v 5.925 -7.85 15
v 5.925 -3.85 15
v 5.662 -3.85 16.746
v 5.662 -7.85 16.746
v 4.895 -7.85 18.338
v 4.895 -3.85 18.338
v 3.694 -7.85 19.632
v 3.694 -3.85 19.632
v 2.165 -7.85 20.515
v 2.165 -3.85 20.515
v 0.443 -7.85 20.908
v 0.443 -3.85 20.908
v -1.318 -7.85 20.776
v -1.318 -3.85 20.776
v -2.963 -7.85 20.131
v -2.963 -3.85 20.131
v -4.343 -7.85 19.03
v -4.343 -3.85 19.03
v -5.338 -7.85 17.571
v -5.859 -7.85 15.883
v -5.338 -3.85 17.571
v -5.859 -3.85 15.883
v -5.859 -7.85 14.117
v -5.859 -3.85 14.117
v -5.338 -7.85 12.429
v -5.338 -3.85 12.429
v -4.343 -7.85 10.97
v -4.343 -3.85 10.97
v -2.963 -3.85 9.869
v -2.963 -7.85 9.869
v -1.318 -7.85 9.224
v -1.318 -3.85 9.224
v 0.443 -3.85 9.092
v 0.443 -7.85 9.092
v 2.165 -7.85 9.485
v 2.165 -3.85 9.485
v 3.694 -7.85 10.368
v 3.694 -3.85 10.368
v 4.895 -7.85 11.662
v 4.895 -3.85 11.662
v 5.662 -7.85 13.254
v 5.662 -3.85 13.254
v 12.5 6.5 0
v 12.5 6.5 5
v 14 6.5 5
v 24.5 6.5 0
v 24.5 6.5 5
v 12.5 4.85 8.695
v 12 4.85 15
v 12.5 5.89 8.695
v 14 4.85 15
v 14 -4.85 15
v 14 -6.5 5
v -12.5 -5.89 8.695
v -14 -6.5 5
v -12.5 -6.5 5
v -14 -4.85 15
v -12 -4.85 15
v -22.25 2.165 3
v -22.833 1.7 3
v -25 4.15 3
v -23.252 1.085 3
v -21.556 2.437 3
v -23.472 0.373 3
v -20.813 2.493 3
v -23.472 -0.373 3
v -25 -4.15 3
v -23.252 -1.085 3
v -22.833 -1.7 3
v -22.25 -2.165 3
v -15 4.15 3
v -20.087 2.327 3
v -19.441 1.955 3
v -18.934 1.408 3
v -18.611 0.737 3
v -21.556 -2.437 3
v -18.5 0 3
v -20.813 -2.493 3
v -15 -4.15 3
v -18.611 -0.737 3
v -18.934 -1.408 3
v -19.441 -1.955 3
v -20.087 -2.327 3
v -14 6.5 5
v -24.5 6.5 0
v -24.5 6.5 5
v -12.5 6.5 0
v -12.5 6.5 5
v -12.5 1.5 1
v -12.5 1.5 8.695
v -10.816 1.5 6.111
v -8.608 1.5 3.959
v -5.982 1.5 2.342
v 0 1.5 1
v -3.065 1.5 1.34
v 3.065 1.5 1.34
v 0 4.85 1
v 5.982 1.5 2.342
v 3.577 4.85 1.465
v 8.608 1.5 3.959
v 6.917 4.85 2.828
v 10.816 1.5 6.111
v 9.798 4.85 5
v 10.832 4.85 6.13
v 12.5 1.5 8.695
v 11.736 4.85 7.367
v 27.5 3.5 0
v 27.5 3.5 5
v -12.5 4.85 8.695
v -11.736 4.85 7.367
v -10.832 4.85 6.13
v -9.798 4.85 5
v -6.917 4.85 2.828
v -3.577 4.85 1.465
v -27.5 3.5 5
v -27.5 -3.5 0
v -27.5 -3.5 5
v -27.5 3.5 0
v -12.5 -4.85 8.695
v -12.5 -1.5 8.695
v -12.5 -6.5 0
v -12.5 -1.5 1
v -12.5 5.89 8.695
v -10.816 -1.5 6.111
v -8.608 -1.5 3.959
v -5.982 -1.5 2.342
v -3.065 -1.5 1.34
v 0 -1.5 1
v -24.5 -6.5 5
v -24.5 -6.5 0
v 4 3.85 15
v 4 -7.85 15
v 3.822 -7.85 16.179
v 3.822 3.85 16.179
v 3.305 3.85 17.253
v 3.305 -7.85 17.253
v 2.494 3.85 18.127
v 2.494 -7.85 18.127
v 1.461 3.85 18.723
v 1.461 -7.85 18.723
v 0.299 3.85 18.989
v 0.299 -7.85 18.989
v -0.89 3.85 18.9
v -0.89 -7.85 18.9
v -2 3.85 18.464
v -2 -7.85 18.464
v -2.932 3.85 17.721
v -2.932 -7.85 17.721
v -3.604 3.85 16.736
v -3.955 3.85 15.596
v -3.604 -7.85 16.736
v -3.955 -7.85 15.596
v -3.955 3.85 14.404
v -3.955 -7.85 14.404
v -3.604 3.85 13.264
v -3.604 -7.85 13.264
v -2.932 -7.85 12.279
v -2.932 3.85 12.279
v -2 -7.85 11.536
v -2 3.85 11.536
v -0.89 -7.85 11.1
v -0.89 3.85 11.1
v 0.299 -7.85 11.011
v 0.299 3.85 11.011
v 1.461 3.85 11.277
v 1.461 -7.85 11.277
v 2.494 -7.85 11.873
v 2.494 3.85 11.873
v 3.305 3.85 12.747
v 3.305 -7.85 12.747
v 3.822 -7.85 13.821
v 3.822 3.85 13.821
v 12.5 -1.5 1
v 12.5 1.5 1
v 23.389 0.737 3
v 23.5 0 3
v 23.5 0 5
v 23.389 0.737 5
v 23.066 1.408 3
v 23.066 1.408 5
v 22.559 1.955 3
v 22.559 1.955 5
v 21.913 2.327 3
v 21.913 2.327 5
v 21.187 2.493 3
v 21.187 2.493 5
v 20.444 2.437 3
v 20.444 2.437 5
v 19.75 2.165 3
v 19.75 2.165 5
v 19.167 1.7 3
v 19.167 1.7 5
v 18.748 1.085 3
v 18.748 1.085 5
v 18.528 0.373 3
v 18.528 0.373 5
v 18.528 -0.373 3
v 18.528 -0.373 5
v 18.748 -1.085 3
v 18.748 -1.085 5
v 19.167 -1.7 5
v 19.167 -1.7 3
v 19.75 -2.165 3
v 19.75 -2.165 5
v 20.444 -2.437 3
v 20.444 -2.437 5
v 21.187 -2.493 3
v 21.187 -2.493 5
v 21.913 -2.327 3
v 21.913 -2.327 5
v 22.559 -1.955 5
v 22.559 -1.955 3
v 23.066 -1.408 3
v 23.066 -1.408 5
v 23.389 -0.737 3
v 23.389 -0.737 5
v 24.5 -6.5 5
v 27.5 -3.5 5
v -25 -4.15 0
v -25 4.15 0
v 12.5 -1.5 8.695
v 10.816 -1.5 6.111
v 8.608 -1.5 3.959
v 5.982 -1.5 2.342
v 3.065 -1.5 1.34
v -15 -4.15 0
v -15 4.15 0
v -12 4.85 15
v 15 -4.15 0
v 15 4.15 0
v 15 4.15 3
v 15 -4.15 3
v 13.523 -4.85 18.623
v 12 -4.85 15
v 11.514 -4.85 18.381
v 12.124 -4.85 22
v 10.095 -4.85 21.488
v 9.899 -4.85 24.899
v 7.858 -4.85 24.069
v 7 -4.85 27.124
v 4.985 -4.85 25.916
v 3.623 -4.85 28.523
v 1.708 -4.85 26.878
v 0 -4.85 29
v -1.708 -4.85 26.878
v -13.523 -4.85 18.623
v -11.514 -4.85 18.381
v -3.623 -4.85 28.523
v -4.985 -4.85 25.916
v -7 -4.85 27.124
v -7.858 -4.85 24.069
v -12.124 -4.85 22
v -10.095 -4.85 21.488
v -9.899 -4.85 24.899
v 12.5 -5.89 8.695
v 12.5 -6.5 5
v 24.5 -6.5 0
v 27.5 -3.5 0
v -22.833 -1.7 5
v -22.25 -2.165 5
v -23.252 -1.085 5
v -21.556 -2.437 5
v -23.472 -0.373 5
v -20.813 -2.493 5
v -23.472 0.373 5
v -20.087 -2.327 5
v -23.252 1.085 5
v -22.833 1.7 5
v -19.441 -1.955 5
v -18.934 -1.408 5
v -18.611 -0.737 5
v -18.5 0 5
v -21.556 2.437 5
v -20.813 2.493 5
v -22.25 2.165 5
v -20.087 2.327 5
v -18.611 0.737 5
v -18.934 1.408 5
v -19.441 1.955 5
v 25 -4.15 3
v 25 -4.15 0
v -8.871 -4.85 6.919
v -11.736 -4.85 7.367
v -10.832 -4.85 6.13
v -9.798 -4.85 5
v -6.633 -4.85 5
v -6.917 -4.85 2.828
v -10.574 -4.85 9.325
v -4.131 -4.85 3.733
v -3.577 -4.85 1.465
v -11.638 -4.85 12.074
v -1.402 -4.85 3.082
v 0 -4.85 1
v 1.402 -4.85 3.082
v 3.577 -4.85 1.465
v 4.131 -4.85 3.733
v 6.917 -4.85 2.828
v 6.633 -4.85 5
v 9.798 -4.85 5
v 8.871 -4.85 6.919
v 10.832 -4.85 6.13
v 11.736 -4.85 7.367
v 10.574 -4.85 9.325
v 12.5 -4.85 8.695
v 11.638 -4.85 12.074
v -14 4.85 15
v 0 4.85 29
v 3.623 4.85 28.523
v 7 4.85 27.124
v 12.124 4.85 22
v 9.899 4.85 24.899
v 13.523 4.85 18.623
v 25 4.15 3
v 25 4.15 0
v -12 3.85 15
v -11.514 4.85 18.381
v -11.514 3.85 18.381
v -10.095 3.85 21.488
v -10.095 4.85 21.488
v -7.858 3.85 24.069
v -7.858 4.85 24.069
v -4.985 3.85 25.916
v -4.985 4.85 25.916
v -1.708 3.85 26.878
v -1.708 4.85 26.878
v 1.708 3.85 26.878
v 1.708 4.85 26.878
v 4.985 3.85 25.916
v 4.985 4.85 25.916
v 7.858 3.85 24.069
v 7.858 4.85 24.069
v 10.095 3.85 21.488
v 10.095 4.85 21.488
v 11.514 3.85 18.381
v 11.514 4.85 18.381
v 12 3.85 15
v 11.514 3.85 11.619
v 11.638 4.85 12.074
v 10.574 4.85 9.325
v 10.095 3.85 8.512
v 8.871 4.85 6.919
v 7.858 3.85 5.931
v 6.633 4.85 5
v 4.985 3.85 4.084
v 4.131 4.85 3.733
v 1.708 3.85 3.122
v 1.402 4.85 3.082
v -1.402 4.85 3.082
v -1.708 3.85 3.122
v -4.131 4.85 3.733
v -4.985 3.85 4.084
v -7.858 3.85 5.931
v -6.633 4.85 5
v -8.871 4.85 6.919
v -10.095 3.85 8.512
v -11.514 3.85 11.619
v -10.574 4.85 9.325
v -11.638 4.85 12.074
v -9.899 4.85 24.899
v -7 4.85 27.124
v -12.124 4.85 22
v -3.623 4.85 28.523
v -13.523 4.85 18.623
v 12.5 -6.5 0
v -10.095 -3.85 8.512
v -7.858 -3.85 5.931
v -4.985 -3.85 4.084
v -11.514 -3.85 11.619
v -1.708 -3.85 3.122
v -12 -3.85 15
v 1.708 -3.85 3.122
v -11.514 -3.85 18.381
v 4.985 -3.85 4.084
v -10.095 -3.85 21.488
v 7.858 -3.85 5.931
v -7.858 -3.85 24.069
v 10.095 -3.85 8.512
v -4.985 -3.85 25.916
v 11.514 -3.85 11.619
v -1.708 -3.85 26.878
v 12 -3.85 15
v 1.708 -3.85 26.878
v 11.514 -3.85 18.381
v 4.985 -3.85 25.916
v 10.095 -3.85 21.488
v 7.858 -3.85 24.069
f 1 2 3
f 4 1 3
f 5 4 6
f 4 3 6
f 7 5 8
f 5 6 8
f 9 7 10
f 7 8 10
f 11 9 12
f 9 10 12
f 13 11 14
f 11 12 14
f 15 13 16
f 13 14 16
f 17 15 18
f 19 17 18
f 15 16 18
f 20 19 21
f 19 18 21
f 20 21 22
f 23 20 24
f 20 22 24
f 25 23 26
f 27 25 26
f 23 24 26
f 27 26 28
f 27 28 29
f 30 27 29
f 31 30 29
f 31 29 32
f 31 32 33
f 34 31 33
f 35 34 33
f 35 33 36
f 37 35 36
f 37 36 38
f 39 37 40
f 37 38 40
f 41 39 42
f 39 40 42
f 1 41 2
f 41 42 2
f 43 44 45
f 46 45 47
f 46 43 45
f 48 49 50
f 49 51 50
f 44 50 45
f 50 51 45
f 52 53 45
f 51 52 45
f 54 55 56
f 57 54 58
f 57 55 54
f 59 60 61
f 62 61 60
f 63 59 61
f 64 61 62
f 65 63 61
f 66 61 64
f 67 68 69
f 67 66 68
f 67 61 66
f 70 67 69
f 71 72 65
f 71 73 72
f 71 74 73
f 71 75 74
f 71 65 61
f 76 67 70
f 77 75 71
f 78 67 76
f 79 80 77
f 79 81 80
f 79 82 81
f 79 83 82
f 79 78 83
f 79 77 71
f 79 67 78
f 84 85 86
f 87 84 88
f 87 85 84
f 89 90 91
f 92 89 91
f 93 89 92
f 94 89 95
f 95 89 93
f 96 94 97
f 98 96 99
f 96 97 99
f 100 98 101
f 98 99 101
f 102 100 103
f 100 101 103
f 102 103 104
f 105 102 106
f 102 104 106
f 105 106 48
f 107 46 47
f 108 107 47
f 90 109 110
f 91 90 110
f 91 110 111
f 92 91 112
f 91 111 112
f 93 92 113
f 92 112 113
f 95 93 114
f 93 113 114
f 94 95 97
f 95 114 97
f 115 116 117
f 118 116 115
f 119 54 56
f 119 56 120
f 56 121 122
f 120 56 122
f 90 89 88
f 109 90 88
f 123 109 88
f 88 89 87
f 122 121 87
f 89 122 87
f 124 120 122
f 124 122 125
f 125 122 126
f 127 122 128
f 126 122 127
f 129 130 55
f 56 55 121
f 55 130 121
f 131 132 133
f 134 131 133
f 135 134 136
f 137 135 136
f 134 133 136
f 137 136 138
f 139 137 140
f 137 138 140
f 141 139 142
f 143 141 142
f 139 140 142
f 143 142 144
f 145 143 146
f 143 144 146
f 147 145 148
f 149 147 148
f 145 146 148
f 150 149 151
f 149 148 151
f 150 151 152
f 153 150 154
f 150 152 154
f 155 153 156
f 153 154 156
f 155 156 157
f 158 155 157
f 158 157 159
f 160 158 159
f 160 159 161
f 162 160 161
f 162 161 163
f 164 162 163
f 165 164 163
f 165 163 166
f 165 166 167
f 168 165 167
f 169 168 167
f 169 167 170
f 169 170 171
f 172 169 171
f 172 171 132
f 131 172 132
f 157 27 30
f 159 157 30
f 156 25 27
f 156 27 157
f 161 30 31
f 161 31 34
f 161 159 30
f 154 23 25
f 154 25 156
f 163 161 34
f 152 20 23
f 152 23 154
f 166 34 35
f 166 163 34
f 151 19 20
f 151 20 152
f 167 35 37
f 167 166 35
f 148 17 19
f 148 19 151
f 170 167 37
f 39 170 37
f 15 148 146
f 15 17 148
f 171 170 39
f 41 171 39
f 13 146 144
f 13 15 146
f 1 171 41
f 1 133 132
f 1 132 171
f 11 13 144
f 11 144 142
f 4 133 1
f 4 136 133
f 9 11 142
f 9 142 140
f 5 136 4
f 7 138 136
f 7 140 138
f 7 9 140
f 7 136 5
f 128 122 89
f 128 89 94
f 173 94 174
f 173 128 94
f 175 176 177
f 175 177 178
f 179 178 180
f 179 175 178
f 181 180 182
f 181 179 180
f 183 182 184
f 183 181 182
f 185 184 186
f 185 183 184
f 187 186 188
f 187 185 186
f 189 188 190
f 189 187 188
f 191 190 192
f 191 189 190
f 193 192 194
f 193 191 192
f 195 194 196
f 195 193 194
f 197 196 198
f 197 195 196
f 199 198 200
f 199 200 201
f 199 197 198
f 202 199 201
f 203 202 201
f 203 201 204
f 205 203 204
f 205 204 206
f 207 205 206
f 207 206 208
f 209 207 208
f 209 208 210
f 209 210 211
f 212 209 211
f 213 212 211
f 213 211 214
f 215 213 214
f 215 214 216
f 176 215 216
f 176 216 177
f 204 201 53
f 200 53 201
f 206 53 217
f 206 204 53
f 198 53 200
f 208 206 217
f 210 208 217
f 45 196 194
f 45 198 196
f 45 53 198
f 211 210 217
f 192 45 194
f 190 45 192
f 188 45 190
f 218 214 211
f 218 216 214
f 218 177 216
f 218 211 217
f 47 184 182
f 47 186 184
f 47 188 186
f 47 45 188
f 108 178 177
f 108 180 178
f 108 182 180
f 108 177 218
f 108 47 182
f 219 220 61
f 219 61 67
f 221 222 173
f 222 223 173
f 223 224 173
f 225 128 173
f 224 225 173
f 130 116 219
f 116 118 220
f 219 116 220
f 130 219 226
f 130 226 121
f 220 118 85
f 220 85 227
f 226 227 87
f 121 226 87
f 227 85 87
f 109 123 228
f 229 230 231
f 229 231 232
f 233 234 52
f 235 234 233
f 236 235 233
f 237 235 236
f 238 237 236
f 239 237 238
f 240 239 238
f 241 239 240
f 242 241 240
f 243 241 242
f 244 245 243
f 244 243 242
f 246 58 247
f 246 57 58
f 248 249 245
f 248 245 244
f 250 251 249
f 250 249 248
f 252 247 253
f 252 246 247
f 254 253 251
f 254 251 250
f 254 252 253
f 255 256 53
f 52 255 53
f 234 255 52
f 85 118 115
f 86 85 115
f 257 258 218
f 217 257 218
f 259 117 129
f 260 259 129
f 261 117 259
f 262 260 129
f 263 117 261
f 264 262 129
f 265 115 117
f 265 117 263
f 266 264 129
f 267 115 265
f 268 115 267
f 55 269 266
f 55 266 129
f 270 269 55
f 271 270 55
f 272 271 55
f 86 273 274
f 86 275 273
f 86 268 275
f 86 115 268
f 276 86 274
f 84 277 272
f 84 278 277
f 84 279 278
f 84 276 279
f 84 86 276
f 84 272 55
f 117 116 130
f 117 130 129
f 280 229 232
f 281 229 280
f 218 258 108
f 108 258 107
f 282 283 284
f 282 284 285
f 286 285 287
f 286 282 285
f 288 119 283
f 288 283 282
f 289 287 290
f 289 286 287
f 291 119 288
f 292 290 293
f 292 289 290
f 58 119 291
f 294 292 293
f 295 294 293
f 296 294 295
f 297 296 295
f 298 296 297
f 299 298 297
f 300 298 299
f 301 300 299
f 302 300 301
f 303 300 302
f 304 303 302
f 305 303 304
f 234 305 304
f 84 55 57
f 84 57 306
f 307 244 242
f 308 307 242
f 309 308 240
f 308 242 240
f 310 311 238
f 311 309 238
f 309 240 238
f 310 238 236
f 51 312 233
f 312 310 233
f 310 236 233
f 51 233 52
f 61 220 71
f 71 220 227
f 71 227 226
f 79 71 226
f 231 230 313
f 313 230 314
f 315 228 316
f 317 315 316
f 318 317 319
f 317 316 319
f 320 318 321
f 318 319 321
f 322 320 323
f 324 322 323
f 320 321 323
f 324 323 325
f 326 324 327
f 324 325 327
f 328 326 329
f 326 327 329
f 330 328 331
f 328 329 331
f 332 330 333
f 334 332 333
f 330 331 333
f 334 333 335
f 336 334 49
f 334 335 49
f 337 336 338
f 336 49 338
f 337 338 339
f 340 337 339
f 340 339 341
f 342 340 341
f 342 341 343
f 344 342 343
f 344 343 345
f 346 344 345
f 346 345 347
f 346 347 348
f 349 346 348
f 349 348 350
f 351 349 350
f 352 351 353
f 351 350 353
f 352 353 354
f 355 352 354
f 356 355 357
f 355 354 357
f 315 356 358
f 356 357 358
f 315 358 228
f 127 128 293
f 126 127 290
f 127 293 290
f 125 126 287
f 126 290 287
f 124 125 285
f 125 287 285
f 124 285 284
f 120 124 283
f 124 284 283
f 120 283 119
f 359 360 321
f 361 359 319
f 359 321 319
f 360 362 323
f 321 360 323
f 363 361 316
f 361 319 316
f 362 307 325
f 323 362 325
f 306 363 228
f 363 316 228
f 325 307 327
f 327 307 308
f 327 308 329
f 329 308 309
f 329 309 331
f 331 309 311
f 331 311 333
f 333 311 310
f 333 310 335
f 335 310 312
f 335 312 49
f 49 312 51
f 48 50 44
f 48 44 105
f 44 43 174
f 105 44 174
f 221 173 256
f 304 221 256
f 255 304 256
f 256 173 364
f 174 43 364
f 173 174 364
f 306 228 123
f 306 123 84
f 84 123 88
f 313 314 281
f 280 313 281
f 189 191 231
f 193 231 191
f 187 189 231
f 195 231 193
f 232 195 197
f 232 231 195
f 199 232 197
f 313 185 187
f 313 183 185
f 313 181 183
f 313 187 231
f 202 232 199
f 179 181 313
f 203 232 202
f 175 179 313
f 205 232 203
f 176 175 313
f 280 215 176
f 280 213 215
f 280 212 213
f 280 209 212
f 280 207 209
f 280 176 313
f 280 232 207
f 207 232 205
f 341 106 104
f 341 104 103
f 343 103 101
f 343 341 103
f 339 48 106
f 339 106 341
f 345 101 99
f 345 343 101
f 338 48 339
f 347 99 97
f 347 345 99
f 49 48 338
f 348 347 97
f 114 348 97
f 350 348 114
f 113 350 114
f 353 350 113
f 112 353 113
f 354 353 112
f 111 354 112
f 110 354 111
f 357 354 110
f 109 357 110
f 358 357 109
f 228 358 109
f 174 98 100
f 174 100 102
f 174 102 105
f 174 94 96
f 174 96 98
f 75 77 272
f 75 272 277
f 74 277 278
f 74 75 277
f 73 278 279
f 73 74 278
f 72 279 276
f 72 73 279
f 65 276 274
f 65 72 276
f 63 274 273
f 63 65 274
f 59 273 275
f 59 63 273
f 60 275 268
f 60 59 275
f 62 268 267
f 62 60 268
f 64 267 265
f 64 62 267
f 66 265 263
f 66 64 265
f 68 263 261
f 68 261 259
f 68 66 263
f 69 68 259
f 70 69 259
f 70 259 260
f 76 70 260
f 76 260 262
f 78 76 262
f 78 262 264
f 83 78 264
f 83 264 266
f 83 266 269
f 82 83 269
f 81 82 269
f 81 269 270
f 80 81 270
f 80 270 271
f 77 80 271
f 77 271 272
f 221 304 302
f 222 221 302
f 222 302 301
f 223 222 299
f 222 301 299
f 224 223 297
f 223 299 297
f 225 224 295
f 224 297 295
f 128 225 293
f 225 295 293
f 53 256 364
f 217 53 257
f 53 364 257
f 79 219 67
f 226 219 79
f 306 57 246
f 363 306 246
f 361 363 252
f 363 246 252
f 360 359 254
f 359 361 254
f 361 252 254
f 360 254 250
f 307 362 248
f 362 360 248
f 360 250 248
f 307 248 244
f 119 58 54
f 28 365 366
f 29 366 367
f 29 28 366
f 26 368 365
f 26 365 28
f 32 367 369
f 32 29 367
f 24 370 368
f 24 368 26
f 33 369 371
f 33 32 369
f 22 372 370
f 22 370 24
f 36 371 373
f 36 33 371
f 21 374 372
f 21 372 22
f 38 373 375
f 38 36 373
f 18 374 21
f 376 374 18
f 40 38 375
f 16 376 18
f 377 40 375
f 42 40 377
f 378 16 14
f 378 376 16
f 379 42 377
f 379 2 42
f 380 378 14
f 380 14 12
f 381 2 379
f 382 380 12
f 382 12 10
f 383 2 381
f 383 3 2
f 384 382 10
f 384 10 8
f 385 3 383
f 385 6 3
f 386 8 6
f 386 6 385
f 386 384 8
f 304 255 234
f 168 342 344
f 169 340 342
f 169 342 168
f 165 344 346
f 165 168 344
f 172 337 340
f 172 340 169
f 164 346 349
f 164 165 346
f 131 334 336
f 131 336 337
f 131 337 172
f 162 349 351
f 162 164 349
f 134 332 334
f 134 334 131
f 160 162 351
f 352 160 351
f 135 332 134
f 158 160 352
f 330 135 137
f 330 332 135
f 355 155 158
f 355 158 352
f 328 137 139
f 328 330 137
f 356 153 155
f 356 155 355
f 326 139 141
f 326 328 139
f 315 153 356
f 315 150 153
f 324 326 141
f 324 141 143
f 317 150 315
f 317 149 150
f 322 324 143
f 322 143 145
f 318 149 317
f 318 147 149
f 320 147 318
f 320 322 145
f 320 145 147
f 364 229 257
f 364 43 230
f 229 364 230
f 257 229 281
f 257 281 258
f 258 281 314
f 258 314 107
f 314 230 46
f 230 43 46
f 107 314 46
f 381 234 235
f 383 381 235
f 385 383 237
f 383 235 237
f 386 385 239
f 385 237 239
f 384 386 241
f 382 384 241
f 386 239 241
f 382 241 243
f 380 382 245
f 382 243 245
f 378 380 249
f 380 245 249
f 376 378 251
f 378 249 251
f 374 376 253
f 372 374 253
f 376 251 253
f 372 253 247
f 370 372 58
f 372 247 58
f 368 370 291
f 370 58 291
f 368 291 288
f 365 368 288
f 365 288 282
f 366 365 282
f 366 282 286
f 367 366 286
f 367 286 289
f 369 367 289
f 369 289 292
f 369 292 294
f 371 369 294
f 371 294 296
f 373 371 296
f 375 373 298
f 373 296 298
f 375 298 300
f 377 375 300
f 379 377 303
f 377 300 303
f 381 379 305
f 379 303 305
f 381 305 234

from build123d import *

# Parameters (mm, degrees)
F0_W      = 15
F0_H      = 13
F0_R      = 2.5
F1_DEPTH  = 5
F2_W      = 28
F2_H      = 13
F3_DEPTH  = 29
F5_DEPTH  = 13.001
F6_W      = 25
F6_H      = 5
F7_DEPTH  = 1
F9_DEPTH  = 14
F10_R     = 12
F11_DEPTH = 2.65
F12_R     = 12
F13_DEPTH = 2.65
F14_R     = 5.925
F15_DEPTH = 4
F16_R     = 4
F17_DEPTH = 14.351
F19_SIZE  = 3
F21_DEPTH = 5
F23_DEPTH = 5
F24_W     = 25
F24_H     = 3
F25_DEPTH = 1
F27_DEPTH = 1.65
F29_DEPTH = 1.65
F30_W     = 10
F30_H     = 8.3
F31_DEPTH = 3


with BuildPart() as f1:
    # F0 (on Top) → F1 (new body)
    with BuildSketch(Plane.XY):
        with Locations((-20, 0)):
            Rectangle(F0_W, F0_H)
        with Locations((-21, 0)):
            Circle(F0_R, mode=Mode.SUBTRACT)
    extrude(amount=F1_DEPTH)


with BuildPart() as f1b:
    # F0 (on Top) → F1, piece 2 (new body)
    with BuildSketch(Plane.XY):
        with Locations((20, 0)):
            Rectangle(F0_W, F0_H)
        with Locations((21, 0)):
            Circle(F0_R, mode=Mode.SUBTRACT)
    extrude(amount=F1_DEPTH)


with BuildPart() as f3:
    # F2 (on Top) → F3 (new body)
    with BuildSketch(Plane.XY):
        Rectangle(F2_W, F2_H)
    extrude(amount=F3_DEPTH)

    # F4 (on face) → F5 (cut, through all)
    with BuildSketch(Plane.XZ.offset(6.5)):
        with BuildLine():
            ThreePointArc((-14, 15), (-9.8994949366, 24.8994949366), (0, 29))
            Line((0, 29), (-14, 29))
            Line((-14, 29), (-14, 15))
        make_face()
        with BuildLine():
            ThreePointArc((0, 29), (9.8994949366, 24.8994949366), (14, 15))
            Line((14, 15), (14, 29))
            Line((14, 29), (0, 29))
        make_face()
    extrude(amount=-F5_DEPTH, mode=Mode.SUBTRACT)

    # F6 (on face) → F7 (cut)
    with BuildSketch(Plane(origin=(0, 0, 0), x_dir=(1, 0, 0), z_dir=(0, 0, -1))):
        with Locations((0, 4)):
            Rectangle(F6_W, F6_H)
        with Locations((0, -4)):
            Rectangle(F6_W, F6_H)
    extrude(amount=-F7_DEPTH, mode=Mode.SUBTRACT)

    # F8 (on Right) → F9 (cut, symmetric)
    with BuildSketch(Plane.YZ):
        Polygon((-6.5, 29), (-6.5, 5), (-4.85, 15), (-4.85, 29), align=None)
        Polygon((4.85, 29), (4.85, 15), (6.5, 5), (6.5, 29), align=None)
    extrude(amount=F9_DEPTH, both=True, mode=Mode.SUBTRACT)

    # F10 (on face) → F11 (cut)
    with BuildSketch(Plane.XZ.offset(6.5)):
        with Locations((0, 15)):
            Circle(F10_R)
    extrude(amount=-F11_DEPTH, mode=Mode.SUBTRACT)

    # F12 (on face) → F13 (cut)
    with BuildSketch(Plane(origin=(0, 6.5, 0), x_dir=(-1, 0, 0), z_dir=(0, 1, 0))):
        with Locations((0, 15)):
            Circle(F12_R)
    extrude(amount=-F13_DEPTH, mode=Mode.SUBTRACT)

    # F14 (on face) → F15 (join)
    with BuildSketch(Plane.XZ.offset(3.85)):
        with Locations((0, 15)):
            Circle(F14_R)
    extrude(amount=F15_DEPTH)

    # F16 (on face) → F17 (cut, through all)
    with BuildSketch(Plane.XZ.offset(7.85)):
        with Locations((0, 15)):
            Circle(F16_R)
    extrude(amount=-F17_DEPTH, mode=Mode.SUBTRACT)


with BuildPart() as f1_1:
    add(f1.part)

    # F18: union F3, F1b
    add(f3.part)
    add(f1b.part)

    # F19
    f19_edges = [f1_1.edges().sort_by_distance(p)[0] for p in [
        (27.5, -6.5, 2.5),
        (27.5, 6.5, 2.5),
        (-27.5, -6.5, 2.5),
        (-27.5, 6.5, 2.5),
    ]]
    chamfer(f19_edges, length=F19_SIZE)

    # F20 (on face) → F21 (cut)
    with BuildSketch(Plane.XZ.offset(6.5)):
        with BuildLine():
            ThreePointArc((12.5, 8.6952398935), (7.3393922678, 3.0780319938), (-6.31e-08, 1))
            Line((-6.31e-08, 1), (12.5, 1))
            Line((12.5, 1), (12.5, 8.6952398935))
        make_face()
        with BuildLine():
            ThreePointArc((-6.31e-08, 1), (-7.3393923215, 3.0780320269), (-12.5, 8.6952398935))
            Line((-12.5, 8.6952398935), (-12.5, 1))
            Line((-12.5, 1), (-6.31e-08, 1))
        make_face()
    extrude(amount=-F21_DEPTH, mode=Mode.SUBTRACT)

    # F22 (on face) → F23 (cut)
    with BuildSketch(Plane(origin=(0, 6.5, 0), x_dir=(-1, 0, 0), z_dir=(0, 1, 0))):
        with BuildLine():
            ThreePointArc((12.5, 8.6952398935), (7.3393922574, 3.0780319875), (-8.75e-08, 1))
            Line((-8.75e-08, 1), (12.5, 1))
            Line((12.5, 1), (12.5, 8.6952398935))
        make_face()
        with BuildLine():
            ThreePointArc((-8.75e-08, 1), (-7.3393923319, 3.0780320333), (-12.5, 8.6952398935))
            Line((-12.5, 8.6952398935), (-12.5, 1))
            Line((-12.5, 1), (-8.75e-08, 1))
        make_face()
    extrude(amount=-F23_DEPTH, mode=Mode.SUBTRACT)

    # F24 (on face) → F25 (cut)
    with BuildSketch(Plane(origin=(0, 0, 0), x_dir=(1, 0, 0), z_dir=(0, 0, -1))):
        Rectangle(F24_W, F24_H)
    extrude(amount=-F25_DEPTH, mode=Mode.SUBTRACT)

    # F26 (on face) → F27 (cut)
    with BuildSketch(Plane.XZ.offset(6.5)):
        with BuildLine():
            ThreePointArc((-12.5, 8.6952398935), (-11.3010372549, 6.7364319472), (-9.7979589711, 5))
            ThreePointArc((-9.7979589711, 5), (0, 1), (9.7979589711, 5))
            ThreePointArc((9.7979589711, 5), (11.3010372549, 6.7364319472), (12.5, 8.6952398935))
            Line((12.5, 8.6952398935), (12, 15))
            ThreePointArc((12, 15), (10.5735281474, 9.3254513381), (6.6332495807, 5))
            ThreePointArc((6.6332495807, 5), (0, 3), (-6.6332495807, 5))
            ThreePointArc((-6.6332495807, 5), (-10.5735281474, 9.3254513381), (-12, 15))
            Line((-12, 15), (-12.5, 8.6952398935))
        make_face()
    extrude(amount=-F27_DEPTH, mode=Mode.SUBTRACT)

    # F28 (on face) → F29 (cut)
    with BuildSketch(Plane(origin=(0, 6.5, 0), x_dir=(-1, 0, 0), z_dir=(0, 1, 0))):
        with BuildLine():
            Line((-12, 15), (-12.5, 8.6952398935))
            ThreePointArc((-12.5, 8.6952398935), (-11.3010372549, 6.7364319472), (-9.7979589711, 5))
            ThreePointArc((-9.7979589711, 5), (0, 1), (9.7979589711, 5))
            ThreePointArc((9.7979589711, 5), (11.3010372549, 6.7364319472), (12.5, 8.6952398935))
            Line((12.5, 8.6952398935), (12, 15))
            ThreePointArc((12, 15), (10.5735281474, 9.3254513381), (6.6332495807, 5))
            ThreePointArc((6.6332495807, 5), (0, 3), (-6.6332495807, 5))
            ThreePointArc((-6.6332495807, 5), (-10.5735281474, 9.3254513381), (-12, 15))
        make_face()
    extrude(amount=-F29_DEPTH, mode=Mode.SUBTRACT)

    # F30 (on face) → F31 (cut)
    with BuildSketch(Plane(origin=(0, 0, 0), x_dir=(1, 0, 0), z_dir=(0, 0, -1))):
        with Locations((-20, 0)):
            Rectangle(F30_W, F30_H)
        with Locations((20, 0)):
            Rectangle(F30_W, F30_H)
    extrude(amount=-F31_DEPTH, mode=Mode.SUBTRACT)


solid = f1_1.part
